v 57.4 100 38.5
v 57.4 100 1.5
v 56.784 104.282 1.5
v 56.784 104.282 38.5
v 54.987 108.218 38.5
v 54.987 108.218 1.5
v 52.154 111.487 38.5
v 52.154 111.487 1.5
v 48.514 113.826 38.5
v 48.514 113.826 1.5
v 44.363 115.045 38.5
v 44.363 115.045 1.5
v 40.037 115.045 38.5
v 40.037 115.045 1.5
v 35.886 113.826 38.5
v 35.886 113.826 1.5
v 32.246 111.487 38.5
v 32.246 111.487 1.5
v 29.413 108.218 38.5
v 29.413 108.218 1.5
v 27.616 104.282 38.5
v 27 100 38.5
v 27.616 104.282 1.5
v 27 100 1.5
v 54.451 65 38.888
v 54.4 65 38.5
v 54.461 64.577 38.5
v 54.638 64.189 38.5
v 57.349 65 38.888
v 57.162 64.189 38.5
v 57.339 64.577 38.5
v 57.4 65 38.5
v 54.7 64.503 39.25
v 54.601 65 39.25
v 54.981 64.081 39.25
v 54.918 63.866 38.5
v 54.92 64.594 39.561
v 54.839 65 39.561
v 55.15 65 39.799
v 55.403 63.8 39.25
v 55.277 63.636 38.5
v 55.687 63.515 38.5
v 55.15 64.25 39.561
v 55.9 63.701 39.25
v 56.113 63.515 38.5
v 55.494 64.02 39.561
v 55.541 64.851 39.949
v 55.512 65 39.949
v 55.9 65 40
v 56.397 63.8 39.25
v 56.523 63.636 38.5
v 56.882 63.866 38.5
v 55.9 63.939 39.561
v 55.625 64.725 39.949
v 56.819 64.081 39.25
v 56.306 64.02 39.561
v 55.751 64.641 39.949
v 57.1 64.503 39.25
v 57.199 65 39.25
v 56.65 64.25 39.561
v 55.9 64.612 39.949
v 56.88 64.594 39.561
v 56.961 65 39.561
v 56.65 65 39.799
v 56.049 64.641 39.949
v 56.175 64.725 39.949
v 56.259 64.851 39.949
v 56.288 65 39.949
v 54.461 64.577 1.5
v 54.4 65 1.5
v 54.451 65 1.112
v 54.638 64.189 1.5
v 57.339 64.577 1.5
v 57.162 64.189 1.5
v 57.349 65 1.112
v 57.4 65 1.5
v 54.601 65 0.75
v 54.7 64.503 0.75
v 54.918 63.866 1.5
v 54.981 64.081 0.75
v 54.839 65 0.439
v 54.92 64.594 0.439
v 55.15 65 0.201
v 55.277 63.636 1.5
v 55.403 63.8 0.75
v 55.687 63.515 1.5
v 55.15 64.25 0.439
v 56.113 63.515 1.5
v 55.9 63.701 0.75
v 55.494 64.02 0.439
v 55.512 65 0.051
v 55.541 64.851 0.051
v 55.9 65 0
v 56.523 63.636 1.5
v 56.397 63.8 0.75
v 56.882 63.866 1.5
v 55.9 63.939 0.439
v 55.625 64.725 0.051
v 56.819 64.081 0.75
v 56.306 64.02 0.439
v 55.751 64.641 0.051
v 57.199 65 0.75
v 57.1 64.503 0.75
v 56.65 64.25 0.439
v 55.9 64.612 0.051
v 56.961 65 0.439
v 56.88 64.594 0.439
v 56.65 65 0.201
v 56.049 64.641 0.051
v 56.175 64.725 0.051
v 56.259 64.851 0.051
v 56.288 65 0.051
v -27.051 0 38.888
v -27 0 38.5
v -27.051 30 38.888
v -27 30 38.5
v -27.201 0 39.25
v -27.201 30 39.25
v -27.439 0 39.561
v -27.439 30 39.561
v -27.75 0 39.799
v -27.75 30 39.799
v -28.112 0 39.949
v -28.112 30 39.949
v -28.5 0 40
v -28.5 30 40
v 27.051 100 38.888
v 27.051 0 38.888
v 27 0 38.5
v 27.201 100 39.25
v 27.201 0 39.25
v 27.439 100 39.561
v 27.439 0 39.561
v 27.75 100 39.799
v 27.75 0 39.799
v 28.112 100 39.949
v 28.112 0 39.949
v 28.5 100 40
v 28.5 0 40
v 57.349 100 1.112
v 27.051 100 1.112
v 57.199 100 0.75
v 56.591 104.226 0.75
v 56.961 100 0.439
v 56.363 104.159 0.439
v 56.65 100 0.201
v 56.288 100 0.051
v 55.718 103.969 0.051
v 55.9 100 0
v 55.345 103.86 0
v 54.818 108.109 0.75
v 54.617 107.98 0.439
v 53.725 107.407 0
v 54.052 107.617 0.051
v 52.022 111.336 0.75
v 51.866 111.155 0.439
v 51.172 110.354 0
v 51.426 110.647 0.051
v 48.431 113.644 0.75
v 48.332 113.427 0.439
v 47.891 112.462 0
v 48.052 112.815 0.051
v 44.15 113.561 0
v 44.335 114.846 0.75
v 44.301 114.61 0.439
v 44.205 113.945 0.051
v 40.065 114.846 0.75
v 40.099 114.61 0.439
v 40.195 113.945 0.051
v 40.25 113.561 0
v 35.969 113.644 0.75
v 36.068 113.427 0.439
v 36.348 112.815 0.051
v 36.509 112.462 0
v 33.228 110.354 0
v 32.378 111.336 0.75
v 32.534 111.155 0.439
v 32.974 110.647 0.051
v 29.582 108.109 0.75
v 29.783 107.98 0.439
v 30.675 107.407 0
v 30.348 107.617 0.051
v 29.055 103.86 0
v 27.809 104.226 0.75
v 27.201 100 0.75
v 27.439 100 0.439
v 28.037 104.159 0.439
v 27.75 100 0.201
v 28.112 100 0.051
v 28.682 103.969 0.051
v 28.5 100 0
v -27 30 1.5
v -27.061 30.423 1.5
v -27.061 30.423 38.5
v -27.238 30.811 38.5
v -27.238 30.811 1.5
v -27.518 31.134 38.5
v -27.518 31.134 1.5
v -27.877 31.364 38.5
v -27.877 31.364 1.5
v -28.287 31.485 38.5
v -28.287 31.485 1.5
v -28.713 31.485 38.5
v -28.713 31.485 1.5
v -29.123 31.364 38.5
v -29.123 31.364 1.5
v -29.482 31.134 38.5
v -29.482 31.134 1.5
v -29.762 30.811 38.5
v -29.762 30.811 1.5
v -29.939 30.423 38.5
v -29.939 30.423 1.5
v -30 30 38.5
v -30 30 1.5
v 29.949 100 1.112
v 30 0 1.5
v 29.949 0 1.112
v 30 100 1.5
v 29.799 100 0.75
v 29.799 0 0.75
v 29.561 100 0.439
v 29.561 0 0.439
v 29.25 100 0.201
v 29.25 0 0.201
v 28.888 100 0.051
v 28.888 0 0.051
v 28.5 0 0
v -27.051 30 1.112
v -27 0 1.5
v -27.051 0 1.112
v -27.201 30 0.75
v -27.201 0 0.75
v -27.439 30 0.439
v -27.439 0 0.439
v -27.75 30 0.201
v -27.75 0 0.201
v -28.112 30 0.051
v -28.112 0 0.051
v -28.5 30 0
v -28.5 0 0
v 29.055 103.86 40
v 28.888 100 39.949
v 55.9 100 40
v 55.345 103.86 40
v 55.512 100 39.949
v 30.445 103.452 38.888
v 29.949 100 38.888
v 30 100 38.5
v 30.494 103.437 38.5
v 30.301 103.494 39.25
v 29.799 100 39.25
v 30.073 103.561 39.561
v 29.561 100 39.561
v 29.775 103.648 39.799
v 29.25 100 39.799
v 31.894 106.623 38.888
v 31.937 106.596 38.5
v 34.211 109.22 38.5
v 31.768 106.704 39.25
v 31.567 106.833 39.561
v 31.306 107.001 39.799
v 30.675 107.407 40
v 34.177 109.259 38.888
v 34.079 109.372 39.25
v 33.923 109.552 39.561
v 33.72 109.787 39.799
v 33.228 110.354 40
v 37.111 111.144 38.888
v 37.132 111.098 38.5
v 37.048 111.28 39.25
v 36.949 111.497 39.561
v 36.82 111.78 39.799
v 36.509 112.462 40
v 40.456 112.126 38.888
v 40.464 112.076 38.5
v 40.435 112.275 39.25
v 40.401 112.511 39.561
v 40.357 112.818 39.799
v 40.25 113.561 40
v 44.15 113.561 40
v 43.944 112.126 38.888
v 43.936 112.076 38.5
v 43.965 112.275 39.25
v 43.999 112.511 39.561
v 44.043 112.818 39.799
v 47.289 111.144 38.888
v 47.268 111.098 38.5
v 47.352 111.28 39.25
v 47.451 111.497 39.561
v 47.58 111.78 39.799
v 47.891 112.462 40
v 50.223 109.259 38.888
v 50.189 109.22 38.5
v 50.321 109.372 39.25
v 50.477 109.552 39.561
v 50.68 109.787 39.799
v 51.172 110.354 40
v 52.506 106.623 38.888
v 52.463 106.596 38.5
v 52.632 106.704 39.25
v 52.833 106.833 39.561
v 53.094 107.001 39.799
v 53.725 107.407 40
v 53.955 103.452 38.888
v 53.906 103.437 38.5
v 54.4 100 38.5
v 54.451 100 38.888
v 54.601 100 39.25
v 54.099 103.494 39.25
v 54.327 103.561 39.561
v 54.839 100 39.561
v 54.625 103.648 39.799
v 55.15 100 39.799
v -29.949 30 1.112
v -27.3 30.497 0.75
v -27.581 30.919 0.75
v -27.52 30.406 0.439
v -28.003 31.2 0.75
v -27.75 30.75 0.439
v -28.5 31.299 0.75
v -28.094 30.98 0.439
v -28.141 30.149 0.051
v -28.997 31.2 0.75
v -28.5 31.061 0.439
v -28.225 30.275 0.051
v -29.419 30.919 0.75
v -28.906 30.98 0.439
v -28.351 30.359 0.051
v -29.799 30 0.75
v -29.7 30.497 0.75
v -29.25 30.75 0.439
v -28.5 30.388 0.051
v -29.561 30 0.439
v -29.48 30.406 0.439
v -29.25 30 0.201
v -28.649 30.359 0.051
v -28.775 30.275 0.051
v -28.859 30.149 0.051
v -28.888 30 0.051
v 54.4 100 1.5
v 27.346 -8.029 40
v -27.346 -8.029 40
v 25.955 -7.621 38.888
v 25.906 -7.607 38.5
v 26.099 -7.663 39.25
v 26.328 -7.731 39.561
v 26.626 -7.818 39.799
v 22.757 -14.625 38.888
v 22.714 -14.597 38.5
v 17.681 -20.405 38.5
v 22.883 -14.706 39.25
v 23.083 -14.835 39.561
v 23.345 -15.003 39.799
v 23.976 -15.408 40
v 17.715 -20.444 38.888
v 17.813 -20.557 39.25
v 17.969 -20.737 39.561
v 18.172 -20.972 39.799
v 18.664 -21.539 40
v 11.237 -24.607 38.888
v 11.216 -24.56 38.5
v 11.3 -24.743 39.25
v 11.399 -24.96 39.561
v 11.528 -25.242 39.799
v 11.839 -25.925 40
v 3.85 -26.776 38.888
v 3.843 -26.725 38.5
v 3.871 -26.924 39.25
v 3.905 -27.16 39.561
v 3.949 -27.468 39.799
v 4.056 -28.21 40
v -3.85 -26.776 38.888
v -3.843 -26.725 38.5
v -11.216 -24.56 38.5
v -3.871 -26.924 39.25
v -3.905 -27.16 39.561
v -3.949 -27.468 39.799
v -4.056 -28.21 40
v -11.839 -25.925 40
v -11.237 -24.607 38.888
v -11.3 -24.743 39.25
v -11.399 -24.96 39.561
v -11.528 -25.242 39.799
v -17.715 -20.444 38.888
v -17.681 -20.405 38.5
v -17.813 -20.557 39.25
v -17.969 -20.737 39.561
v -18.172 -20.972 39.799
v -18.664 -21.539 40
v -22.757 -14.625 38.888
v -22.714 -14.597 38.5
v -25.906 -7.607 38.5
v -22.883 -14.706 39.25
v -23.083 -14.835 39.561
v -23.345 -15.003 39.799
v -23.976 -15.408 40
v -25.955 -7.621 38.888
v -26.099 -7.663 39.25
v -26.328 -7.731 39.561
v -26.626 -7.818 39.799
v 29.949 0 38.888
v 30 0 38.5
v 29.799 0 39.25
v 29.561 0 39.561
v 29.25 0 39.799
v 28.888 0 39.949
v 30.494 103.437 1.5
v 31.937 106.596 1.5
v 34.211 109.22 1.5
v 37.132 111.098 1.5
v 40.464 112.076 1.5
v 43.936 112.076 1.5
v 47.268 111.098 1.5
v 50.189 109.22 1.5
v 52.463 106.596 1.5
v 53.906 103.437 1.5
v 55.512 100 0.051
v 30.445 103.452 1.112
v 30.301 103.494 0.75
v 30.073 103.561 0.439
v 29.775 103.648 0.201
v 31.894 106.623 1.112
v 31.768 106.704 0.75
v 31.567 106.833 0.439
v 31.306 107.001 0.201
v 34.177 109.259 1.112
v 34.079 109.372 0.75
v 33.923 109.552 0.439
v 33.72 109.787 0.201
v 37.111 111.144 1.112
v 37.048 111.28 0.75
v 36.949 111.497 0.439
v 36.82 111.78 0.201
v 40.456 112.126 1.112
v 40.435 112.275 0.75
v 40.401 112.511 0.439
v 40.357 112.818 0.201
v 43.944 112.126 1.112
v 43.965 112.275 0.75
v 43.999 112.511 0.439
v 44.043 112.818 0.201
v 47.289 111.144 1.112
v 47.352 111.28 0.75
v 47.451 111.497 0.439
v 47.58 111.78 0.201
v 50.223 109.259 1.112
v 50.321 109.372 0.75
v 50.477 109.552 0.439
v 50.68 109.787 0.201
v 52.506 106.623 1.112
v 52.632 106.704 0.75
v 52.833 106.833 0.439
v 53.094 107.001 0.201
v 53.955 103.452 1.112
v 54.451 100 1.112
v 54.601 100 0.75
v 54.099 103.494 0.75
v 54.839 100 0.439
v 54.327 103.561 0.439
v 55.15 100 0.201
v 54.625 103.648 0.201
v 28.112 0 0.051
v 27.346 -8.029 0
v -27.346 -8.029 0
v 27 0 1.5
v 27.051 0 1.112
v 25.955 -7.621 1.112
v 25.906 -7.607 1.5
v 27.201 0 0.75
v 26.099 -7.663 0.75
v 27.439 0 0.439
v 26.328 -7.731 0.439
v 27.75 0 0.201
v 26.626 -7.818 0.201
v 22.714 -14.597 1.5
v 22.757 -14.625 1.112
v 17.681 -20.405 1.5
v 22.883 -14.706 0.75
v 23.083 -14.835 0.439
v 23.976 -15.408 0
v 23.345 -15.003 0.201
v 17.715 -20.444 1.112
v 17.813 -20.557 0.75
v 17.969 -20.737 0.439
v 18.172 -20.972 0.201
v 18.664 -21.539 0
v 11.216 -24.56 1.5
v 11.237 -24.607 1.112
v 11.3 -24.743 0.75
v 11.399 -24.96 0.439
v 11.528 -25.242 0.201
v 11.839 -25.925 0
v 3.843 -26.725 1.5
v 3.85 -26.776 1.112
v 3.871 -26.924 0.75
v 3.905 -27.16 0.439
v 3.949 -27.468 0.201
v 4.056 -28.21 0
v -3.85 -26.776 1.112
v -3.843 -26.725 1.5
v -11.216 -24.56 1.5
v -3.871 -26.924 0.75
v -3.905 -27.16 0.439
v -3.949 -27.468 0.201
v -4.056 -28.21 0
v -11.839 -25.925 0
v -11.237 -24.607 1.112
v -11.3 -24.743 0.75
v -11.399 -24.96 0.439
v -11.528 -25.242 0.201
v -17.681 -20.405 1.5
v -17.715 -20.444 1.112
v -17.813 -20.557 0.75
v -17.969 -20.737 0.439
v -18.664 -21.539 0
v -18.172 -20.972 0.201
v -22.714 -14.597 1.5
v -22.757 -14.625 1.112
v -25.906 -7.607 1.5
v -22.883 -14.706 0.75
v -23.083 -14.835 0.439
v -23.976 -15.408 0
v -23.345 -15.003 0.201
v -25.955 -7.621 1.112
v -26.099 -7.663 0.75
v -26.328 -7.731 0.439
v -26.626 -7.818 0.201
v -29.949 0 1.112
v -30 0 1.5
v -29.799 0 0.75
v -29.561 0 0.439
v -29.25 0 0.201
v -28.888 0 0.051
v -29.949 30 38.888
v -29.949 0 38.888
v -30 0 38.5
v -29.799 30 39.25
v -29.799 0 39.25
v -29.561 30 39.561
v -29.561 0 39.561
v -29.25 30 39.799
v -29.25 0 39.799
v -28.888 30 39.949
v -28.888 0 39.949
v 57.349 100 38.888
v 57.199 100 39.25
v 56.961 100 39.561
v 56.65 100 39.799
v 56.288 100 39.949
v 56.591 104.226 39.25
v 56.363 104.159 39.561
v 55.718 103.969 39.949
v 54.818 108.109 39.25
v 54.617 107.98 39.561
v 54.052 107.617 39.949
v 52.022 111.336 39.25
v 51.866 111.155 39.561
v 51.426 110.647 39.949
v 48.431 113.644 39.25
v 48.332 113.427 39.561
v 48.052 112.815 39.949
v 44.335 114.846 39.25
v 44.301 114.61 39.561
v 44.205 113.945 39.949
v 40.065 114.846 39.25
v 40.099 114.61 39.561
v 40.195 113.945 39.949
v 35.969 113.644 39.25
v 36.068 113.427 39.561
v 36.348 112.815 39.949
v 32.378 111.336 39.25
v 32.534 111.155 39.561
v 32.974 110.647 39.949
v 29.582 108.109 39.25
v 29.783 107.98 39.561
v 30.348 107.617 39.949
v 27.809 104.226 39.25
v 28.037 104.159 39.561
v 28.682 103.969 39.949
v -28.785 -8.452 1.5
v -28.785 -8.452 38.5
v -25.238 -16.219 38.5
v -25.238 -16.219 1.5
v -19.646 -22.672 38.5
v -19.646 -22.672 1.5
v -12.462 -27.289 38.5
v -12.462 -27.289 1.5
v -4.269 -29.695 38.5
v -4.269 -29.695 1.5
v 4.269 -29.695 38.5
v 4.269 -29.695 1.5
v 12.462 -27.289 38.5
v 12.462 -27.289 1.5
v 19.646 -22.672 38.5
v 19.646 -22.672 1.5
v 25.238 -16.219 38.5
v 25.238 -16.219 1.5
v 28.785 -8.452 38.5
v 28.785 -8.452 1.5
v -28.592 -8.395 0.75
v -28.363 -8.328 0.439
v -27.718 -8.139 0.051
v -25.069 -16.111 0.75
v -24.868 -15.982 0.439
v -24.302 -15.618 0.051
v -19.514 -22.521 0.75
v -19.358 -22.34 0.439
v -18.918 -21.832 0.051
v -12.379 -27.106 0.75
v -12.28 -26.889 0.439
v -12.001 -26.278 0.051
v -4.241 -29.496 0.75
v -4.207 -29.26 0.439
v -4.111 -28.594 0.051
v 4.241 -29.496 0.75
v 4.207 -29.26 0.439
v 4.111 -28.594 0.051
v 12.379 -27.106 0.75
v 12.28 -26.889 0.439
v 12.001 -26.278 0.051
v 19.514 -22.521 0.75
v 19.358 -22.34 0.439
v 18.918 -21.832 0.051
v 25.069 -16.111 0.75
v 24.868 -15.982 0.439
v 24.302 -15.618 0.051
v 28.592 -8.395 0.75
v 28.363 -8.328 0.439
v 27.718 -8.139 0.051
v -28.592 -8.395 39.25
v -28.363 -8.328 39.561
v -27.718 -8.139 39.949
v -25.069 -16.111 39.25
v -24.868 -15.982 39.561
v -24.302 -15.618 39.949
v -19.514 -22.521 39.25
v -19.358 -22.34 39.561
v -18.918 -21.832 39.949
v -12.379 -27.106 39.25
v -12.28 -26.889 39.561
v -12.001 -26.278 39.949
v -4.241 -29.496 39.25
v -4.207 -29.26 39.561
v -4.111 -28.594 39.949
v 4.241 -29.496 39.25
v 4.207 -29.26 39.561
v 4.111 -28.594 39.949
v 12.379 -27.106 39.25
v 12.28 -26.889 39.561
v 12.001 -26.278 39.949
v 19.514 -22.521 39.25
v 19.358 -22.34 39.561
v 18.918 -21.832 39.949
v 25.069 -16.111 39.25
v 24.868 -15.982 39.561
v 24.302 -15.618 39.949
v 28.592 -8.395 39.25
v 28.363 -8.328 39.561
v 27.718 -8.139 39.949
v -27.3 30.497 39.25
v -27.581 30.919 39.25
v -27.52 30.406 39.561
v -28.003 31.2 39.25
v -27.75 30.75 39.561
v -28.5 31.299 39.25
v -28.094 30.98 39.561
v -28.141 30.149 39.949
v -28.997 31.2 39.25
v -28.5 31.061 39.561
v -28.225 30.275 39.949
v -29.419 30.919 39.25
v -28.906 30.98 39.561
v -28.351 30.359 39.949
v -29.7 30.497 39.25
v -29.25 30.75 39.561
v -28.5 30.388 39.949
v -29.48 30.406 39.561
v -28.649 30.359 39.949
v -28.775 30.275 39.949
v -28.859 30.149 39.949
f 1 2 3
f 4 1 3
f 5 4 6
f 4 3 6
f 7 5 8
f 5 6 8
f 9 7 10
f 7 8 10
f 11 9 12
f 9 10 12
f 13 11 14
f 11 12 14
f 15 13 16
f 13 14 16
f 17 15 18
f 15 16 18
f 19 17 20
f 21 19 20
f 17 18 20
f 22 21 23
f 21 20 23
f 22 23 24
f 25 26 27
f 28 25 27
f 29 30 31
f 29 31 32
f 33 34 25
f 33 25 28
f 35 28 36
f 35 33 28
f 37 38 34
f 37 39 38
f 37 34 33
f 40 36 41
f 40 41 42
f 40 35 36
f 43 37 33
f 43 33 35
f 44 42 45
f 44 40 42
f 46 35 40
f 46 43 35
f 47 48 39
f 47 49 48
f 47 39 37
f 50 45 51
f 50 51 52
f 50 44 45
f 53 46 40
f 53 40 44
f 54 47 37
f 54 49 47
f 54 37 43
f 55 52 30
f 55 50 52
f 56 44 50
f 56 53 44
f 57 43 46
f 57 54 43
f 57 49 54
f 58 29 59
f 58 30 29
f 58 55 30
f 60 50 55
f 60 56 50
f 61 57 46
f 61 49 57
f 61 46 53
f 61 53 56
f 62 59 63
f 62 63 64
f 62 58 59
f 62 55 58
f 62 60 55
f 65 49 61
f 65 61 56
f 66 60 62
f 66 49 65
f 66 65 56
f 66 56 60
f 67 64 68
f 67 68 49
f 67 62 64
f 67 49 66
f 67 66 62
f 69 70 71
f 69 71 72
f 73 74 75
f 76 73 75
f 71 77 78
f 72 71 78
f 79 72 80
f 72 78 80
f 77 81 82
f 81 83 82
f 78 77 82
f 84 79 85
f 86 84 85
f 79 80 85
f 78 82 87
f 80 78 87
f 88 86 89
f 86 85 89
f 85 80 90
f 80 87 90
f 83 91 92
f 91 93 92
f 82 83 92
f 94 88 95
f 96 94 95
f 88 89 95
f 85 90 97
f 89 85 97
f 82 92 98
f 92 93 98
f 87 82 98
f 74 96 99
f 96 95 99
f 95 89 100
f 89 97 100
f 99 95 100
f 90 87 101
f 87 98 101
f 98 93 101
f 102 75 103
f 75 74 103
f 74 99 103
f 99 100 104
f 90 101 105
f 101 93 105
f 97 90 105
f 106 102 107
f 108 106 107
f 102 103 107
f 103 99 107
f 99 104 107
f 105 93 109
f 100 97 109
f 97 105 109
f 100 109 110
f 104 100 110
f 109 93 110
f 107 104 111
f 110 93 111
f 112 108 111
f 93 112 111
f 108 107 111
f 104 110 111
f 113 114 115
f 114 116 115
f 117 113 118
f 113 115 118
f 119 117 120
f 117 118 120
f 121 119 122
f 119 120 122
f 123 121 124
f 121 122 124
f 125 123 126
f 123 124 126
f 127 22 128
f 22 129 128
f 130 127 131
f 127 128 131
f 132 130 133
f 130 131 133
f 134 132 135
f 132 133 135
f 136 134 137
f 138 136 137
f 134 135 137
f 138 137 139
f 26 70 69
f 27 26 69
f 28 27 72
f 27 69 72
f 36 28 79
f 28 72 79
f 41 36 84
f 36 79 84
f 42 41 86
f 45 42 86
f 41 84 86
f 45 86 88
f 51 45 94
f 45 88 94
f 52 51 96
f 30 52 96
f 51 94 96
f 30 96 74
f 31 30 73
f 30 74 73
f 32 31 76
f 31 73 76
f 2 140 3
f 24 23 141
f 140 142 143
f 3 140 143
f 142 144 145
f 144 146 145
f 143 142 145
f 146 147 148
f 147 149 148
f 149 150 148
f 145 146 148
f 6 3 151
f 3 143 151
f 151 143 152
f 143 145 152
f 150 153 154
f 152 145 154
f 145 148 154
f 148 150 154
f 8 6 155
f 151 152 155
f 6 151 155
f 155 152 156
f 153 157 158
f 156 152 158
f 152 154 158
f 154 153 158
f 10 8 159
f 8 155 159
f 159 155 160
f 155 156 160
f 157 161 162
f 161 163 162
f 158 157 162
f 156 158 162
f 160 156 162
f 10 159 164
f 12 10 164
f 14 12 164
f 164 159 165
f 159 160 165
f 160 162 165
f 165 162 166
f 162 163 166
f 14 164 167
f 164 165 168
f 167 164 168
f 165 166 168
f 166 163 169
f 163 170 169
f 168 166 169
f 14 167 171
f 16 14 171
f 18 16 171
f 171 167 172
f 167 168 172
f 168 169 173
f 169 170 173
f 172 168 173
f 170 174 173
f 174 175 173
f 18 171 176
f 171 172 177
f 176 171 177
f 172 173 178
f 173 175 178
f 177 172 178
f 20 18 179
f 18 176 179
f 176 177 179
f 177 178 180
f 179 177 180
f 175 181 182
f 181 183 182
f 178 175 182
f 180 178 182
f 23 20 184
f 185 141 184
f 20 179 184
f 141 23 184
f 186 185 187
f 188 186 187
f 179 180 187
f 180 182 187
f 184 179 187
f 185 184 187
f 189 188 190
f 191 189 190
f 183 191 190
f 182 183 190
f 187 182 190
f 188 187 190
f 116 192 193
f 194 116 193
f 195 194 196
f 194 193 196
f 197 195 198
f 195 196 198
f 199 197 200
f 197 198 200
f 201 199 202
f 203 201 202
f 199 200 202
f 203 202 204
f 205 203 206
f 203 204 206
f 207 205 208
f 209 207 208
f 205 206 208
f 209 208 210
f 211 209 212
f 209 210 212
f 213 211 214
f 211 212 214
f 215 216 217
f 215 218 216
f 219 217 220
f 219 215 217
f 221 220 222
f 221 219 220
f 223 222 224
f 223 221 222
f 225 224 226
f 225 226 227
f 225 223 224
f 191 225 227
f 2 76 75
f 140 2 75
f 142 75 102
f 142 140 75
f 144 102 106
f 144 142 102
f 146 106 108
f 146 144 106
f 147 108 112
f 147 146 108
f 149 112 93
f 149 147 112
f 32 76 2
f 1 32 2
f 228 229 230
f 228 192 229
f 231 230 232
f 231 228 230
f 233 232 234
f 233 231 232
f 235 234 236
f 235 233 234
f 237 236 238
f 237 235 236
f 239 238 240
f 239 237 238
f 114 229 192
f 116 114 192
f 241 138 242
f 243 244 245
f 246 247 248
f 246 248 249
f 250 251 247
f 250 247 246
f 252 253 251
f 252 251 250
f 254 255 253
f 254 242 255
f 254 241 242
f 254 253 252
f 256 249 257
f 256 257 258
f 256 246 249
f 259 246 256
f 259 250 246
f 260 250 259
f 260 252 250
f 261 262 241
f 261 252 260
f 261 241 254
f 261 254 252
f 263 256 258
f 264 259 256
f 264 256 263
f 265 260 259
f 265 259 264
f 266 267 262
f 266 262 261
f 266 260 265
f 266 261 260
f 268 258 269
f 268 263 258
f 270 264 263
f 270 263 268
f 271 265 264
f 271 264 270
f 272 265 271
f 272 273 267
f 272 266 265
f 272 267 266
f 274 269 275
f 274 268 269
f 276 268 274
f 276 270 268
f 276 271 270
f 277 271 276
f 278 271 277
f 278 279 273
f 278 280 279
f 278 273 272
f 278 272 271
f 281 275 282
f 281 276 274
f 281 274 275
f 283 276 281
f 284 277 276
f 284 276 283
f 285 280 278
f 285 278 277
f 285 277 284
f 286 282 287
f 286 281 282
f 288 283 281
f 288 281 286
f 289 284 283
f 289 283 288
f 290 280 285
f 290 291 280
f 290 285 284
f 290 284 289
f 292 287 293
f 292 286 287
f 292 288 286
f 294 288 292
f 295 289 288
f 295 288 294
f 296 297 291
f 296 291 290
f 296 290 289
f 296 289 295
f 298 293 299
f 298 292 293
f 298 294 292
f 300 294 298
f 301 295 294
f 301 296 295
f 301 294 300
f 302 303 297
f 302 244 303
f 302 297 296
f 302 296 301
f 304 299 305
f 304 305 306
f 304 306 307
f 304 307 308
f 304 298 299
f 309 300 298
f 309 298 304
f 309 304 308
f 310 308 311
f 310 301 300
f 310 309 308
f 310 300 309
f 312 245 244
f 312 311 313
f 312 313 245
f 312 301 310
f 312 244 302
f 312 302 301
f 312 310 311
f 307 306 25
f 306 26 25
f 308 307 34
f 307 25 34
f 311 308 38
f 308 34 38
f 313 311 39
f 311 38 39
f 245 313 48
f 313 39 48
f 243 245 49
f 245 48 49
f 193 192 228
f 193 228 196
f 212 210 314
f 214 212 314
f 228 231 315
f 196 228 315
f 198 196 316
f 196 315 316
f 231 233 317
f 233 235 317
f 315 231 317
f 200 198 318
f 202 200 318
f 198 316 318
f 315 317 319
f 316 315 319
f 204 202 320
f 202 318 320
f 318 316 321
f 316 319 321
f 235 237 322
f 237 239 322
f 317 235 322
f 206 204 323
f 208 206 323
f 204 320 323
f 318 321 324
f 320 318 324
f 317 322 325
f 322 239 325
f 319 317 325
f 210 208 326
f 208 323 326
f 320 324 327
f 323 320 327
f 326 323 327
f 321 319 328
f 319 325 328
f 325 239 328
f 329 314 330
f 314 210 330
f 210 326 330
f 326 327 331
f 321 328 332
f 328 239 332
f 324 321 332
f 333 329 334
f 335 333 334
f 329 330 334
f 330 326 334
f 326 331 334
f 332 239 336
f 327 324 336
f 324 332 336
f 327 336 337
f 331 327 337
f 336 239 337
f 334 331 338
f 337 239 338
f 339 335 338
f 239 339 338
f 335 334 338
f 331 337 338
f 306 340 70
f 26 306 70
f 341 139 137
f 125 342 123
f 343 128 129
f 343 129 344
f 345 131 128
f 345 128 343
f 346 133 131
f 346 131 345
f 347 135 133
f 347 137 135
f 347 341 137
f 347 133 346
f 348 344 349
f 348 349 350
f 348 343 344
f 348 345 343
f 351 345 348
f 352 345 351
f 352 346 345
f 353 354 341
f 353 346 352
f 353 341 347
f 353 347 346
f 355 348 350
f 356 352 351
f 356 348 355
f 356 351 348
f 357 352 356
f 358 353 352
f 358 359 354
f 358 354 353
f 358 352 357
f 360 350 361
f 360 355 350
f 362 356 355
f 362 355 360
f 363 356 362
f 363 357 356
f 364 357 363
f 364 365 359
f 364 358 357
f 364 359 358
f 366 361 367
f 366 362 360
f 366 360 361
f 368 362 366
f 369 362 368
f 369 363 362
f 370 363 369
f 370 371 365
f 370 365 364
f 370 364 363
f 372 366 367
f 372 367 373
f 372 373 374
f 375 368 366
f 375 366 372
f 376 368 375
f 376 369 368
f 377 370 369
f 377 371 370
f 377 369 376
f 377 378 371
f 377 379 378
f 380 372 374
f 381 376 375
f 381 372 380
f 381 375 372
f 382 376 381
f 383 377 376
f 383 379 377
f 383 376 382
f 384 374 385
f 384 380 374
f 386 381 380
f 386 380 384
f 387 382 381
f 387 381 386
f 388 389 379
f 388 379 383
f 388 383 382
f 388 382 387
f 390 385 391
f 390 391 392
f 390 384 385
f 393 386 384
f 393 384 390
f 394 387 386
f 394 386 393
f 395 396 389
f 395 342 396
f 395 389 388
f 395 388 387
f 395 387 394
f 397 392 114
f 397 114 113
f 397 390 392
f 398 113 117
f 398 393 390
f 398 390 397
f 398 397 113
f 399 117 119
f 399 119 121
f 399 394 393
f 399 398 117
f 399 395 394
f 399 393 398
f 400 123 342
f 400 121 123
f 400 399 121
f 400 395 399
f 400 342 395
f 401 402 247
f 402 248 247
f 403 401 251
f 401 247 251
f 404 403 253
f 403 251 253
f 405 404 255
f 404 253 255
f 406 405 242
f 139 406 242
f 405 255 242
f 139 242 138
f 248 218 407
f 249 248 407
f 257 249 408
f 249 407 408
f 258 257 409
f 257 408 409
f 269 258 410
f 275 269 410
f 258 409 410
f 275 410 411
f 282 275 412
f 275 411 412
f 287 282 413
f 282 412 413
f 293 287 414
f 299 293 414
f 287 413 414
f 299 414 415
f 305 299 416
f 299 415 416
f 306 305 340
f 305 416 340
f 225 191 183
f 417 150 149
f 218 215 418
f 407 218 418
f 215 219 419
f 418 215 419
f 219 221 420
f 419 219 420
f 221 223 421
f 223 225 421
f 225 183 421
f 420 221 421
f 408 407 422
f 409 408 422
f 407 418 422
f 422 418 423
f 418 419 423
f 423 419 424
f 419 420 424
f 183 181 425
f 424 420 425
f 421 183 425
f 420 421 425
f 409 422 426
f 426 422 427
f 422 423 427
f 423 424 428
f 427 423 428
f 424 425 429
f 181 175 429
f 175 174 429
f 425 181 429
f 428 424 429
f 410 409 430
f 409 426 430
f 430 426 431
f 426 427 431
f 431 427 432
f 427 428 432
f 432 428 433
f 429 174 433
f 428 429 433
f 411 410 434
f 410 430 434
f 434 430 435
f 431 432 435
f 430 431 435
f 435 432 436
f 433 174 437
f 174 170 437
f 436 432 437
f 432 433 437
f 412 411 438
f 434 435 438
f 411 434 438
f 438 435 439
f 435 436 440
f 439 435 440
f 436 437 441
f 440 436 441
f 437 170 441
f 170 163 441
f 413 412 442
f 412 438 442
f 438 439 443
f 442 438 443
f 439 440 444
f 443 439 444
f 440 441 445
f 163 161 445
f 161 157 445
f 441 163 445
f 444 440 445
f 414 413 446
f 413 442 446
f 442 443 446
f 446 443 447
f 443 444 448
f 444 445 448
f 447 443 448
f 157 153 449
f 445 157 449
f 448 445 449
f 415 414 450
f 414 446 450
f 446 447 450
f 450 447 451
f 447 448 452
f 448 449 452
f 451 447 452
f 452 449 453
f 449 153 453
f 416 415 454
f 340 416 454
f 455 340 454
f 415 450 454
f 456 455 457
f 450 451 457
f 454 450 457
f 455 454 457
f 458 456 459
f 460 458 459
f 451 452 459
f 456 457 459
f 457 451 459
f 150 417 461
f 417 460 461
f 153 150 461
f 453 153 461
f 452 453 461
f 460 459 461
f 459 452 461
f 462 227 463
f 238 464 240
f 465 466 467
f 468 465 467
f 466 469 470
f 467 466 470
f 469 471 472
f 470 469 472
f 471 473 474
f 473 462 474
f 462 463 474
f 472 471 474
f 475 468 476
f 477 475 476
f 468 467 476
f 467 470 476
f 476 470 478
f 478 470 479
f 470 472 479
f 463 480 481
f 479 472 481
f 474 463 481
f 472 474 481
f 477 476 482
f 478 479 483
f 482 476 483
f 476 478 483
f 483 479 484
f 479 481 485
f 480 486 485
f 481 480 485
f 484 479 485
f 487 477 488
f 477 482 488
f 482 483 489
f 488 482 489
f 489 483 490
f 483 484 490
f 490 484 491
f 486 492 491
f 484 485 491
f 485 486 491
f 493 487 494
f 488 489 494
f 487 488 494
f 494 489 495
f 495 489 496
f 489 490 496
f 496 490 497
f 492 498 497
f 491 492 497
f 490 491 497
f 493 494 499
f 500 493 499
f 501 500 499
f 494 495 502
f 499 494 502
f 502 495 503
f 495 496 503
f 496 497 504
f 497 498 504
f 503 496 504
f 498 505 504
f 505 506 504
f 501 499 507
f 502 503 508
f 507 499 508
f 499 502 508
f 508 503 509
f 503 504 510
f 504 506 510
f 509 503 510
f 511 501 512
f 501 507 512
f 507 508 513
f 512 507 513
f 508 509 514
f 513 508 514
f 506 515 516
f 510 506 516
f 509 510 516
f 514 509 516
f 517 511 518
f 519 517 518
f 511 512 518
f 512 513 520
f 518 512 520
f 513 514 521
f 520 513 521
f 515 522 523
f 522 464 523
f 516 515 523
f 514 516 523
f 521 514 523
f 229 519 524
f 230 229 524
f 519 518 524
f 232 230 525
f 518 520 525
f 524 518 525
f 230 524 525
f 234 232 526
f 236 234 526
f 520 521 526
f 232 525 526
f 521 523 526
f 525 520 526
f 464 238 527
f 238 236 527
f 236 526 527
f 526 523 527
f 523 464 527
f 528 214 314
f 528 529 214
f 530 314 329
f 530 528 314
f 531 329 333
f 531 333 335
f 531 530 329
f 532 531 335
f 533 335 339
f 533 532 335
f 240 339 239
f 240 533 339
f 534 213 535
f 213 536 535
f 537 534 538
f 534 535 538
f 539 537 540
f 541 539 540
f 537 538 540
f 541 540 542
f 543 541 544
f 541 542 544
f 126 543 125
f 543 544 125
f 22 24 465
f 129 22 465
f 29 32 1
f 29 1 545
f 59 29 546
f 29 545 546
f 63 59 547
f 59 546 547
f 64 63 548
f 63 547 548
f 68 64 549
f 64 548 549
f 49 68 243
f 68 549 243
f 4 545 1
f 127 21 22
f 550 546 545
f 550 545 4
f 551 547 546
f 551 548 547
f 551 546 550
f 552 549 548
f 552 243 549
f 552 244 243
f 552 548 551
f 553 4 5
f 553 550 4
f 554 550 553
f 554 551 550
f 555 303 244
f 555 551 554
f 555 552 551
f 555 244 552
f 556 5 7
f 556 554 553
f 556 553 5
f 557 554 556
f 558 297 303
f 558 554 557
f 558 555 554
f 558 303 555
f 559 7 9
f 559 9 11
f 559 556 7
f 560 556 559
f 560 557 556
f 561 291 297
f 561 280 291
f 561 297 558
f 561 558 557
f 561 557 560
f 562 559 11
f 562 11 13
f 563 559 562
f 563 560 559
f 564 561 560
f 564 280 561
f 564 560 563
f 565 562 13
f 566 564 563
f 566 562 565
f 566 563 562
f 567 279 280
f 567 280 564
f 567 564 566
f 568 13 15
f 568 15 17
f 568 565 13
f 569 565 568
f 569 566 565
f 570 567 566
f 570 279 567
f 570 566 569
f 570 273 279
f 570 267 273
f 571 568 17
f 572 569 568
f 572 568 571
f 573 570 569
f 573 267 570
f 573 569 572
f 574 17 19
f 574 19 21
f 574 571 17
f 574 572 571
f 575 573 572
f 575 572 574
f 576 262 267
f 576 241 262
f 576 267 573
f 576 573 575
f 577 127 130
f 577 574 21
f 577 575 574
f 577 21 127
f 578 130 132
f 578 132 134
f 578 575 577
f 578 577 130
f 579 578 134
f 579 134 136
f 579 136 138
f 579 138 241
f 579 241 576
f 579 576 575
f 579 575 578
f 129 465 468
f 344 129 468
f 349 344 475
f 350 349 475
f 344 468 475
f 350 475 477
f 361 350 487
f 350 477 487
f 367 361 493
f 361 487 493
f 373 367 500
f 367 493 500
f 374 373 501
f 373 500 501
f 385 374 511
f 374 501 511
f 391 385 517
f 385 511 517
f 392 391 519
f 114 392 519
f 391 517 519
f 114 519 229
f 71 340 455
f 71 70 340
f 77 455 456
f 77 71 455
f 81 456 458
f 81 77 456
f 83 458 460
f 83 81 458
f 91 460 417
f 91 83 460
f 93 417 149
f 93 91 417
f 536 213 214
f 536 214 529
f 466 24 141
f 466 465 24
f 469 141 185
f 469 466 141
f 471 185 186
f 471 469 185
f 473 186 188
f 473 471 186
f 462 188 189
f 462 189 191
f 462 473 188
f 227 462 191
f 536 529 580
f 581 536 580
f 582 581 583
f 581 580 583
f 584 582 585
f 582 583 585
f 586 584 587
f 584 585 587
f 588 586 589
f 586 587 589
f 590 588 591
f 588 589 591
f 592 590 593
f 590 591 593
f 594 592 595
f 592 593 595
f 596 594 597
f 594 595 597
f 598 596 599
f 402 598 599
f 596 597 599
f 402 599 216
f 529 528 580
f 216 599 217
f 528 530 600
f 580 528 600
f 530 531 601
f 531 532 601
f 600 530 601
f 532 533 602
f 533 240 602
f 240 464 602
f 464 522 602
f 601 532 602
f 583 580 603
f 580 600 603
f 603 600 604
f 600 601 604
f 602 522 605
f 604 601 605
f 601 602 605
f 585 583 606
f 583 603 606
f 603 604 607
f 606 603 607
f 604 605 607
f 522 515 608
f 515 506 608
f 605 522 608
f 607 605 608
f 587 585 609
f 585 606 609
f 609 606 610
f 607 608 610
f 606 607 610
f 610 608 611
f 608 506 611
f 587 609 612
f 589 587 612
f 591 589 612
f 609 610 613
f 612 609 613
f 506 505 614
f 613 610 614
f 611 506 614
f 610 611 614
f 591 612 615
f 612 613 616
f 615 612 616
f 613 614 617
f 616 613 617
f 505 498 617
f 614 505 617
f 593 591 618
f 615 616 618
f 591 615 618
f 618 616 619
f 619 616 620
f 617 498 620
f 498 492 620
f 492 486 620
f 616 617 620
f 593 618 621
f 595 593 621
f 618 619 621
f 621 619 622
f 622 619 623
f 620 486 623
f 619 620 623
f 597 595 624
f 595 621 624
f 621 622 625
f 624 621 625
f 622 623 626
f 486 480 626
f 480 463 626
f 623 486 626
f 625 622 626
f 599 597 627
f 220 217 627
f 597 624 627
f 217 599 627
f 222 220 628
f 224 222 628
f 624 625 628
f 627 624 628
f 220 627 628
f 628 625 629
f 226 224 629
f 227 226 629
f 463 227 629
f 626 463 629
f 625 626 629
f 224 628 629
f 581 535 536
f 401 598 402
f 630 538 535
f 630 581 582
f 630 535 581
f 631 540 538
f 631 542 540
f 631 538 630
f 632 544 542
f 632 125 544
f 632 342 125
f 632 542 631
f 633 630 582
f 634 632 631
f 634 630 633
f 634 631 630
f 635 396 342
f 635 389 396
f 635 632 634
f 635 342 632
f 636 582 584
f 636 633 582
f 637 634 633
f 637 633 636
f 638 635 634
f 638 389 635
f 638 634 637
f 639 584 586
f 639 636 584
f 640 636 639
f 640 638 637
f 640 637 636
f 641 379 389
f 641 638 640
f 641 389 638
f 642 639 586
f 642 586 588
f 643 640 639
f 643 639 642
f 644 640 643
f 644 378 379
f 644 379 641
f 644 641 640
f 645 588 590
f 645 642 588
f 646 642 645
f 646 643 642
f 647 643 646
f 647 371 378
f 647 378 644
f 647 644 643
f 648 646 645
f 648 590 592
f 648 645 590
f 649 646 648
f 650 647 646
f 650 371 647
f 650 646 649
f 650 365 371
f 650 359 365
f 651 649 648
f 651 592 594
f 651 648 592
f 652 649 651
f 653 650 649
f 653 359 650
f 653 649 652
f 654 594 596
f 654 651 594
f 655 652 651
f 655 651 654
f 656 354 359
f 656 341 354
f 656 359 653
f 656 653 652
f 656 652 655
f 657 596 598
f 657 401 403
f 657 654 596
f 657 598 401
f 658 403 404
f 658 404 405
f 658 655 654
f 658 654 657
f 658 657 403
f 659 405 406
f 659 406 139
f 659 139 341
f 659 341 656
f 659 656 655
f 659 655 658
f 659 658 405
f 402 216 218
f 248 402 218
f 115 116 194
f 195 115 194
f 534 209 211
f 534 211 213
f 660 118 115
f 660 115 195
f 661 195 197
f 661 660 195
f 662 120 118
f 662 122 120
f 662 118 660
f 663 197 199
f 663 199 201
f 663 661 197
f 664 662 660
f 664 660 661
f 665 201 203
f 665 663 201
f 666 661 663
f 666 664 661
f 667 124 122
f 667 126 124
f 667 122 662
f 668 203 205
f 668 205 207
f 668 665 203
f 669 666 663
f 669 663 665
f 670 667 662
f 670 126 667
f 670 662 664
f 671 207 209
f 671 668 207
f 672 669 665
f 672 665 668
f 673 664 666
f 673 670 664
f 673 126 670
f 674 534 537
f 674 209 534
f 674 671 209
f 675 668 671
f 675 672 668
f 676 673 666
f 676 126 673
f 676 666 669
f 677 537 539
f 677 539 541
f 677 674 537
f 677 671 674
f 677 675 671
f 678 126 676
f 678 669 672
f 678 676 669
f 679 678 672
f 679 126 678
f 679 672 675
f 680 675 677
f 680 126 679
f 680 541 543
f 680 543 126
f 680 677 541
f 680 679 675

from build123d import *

# Parameters (mm, degrees)
F1_DEPTH = 40
F2_R     = 1.49999


# Not quite as in the source:
# - a fillet or chamfer is up to 0.001 mm smaller than in the source, because OpenCascade refuses the exact size


with BuildPart() as f1:
    # F0 (on Top) → F1 (new body)
    with BuildSketch(Plane.XY):
        with BuildLine():
            ThreePointArc((-30, 0), (0, -30), (30, 0))
            Line((30, 0), (30, 100))
            ThreePointArc((30, 100), (42.1999996752, 112.1999996752), (54.3999993503, 100))
            Line((54.3999993503, 100), (54.3999993503, 65))
            ThreePointArc((54.3999993503, 65), (55.8999993503, 63.5), (57.3999993503, 65))
            Line((57.3999993503, 65), (57.3999993503, 100))
            ThreePointArc((57.3999993503, 100), (42.1999996752, 115.1999996752), (27, 100))
            Line((27, 100), (27, 0))
            ThreePointArc((27, 0), (0, -27), (-27, 0))
            Line((-27, 0), (-27, 30))
            ThreePointArc((-27, 30), (-28.5, 31.5), (-30, 30))
            Line((-30, 30), (-30, 0))
        make_face()
    extrude(amount=F1_DEPTH)

    # F2 (radius 1.5 in the source; OpenCascade refuses exactly that, so slightly less here)
    f2_edges = [f1.edges().sort_by_distance(p)[0] for p in [
        (-30, 15, 40),
        (-30, 15, 0),
    ]]
    fillet(f2_edges, radius=F2_R)


solid = f1.part
